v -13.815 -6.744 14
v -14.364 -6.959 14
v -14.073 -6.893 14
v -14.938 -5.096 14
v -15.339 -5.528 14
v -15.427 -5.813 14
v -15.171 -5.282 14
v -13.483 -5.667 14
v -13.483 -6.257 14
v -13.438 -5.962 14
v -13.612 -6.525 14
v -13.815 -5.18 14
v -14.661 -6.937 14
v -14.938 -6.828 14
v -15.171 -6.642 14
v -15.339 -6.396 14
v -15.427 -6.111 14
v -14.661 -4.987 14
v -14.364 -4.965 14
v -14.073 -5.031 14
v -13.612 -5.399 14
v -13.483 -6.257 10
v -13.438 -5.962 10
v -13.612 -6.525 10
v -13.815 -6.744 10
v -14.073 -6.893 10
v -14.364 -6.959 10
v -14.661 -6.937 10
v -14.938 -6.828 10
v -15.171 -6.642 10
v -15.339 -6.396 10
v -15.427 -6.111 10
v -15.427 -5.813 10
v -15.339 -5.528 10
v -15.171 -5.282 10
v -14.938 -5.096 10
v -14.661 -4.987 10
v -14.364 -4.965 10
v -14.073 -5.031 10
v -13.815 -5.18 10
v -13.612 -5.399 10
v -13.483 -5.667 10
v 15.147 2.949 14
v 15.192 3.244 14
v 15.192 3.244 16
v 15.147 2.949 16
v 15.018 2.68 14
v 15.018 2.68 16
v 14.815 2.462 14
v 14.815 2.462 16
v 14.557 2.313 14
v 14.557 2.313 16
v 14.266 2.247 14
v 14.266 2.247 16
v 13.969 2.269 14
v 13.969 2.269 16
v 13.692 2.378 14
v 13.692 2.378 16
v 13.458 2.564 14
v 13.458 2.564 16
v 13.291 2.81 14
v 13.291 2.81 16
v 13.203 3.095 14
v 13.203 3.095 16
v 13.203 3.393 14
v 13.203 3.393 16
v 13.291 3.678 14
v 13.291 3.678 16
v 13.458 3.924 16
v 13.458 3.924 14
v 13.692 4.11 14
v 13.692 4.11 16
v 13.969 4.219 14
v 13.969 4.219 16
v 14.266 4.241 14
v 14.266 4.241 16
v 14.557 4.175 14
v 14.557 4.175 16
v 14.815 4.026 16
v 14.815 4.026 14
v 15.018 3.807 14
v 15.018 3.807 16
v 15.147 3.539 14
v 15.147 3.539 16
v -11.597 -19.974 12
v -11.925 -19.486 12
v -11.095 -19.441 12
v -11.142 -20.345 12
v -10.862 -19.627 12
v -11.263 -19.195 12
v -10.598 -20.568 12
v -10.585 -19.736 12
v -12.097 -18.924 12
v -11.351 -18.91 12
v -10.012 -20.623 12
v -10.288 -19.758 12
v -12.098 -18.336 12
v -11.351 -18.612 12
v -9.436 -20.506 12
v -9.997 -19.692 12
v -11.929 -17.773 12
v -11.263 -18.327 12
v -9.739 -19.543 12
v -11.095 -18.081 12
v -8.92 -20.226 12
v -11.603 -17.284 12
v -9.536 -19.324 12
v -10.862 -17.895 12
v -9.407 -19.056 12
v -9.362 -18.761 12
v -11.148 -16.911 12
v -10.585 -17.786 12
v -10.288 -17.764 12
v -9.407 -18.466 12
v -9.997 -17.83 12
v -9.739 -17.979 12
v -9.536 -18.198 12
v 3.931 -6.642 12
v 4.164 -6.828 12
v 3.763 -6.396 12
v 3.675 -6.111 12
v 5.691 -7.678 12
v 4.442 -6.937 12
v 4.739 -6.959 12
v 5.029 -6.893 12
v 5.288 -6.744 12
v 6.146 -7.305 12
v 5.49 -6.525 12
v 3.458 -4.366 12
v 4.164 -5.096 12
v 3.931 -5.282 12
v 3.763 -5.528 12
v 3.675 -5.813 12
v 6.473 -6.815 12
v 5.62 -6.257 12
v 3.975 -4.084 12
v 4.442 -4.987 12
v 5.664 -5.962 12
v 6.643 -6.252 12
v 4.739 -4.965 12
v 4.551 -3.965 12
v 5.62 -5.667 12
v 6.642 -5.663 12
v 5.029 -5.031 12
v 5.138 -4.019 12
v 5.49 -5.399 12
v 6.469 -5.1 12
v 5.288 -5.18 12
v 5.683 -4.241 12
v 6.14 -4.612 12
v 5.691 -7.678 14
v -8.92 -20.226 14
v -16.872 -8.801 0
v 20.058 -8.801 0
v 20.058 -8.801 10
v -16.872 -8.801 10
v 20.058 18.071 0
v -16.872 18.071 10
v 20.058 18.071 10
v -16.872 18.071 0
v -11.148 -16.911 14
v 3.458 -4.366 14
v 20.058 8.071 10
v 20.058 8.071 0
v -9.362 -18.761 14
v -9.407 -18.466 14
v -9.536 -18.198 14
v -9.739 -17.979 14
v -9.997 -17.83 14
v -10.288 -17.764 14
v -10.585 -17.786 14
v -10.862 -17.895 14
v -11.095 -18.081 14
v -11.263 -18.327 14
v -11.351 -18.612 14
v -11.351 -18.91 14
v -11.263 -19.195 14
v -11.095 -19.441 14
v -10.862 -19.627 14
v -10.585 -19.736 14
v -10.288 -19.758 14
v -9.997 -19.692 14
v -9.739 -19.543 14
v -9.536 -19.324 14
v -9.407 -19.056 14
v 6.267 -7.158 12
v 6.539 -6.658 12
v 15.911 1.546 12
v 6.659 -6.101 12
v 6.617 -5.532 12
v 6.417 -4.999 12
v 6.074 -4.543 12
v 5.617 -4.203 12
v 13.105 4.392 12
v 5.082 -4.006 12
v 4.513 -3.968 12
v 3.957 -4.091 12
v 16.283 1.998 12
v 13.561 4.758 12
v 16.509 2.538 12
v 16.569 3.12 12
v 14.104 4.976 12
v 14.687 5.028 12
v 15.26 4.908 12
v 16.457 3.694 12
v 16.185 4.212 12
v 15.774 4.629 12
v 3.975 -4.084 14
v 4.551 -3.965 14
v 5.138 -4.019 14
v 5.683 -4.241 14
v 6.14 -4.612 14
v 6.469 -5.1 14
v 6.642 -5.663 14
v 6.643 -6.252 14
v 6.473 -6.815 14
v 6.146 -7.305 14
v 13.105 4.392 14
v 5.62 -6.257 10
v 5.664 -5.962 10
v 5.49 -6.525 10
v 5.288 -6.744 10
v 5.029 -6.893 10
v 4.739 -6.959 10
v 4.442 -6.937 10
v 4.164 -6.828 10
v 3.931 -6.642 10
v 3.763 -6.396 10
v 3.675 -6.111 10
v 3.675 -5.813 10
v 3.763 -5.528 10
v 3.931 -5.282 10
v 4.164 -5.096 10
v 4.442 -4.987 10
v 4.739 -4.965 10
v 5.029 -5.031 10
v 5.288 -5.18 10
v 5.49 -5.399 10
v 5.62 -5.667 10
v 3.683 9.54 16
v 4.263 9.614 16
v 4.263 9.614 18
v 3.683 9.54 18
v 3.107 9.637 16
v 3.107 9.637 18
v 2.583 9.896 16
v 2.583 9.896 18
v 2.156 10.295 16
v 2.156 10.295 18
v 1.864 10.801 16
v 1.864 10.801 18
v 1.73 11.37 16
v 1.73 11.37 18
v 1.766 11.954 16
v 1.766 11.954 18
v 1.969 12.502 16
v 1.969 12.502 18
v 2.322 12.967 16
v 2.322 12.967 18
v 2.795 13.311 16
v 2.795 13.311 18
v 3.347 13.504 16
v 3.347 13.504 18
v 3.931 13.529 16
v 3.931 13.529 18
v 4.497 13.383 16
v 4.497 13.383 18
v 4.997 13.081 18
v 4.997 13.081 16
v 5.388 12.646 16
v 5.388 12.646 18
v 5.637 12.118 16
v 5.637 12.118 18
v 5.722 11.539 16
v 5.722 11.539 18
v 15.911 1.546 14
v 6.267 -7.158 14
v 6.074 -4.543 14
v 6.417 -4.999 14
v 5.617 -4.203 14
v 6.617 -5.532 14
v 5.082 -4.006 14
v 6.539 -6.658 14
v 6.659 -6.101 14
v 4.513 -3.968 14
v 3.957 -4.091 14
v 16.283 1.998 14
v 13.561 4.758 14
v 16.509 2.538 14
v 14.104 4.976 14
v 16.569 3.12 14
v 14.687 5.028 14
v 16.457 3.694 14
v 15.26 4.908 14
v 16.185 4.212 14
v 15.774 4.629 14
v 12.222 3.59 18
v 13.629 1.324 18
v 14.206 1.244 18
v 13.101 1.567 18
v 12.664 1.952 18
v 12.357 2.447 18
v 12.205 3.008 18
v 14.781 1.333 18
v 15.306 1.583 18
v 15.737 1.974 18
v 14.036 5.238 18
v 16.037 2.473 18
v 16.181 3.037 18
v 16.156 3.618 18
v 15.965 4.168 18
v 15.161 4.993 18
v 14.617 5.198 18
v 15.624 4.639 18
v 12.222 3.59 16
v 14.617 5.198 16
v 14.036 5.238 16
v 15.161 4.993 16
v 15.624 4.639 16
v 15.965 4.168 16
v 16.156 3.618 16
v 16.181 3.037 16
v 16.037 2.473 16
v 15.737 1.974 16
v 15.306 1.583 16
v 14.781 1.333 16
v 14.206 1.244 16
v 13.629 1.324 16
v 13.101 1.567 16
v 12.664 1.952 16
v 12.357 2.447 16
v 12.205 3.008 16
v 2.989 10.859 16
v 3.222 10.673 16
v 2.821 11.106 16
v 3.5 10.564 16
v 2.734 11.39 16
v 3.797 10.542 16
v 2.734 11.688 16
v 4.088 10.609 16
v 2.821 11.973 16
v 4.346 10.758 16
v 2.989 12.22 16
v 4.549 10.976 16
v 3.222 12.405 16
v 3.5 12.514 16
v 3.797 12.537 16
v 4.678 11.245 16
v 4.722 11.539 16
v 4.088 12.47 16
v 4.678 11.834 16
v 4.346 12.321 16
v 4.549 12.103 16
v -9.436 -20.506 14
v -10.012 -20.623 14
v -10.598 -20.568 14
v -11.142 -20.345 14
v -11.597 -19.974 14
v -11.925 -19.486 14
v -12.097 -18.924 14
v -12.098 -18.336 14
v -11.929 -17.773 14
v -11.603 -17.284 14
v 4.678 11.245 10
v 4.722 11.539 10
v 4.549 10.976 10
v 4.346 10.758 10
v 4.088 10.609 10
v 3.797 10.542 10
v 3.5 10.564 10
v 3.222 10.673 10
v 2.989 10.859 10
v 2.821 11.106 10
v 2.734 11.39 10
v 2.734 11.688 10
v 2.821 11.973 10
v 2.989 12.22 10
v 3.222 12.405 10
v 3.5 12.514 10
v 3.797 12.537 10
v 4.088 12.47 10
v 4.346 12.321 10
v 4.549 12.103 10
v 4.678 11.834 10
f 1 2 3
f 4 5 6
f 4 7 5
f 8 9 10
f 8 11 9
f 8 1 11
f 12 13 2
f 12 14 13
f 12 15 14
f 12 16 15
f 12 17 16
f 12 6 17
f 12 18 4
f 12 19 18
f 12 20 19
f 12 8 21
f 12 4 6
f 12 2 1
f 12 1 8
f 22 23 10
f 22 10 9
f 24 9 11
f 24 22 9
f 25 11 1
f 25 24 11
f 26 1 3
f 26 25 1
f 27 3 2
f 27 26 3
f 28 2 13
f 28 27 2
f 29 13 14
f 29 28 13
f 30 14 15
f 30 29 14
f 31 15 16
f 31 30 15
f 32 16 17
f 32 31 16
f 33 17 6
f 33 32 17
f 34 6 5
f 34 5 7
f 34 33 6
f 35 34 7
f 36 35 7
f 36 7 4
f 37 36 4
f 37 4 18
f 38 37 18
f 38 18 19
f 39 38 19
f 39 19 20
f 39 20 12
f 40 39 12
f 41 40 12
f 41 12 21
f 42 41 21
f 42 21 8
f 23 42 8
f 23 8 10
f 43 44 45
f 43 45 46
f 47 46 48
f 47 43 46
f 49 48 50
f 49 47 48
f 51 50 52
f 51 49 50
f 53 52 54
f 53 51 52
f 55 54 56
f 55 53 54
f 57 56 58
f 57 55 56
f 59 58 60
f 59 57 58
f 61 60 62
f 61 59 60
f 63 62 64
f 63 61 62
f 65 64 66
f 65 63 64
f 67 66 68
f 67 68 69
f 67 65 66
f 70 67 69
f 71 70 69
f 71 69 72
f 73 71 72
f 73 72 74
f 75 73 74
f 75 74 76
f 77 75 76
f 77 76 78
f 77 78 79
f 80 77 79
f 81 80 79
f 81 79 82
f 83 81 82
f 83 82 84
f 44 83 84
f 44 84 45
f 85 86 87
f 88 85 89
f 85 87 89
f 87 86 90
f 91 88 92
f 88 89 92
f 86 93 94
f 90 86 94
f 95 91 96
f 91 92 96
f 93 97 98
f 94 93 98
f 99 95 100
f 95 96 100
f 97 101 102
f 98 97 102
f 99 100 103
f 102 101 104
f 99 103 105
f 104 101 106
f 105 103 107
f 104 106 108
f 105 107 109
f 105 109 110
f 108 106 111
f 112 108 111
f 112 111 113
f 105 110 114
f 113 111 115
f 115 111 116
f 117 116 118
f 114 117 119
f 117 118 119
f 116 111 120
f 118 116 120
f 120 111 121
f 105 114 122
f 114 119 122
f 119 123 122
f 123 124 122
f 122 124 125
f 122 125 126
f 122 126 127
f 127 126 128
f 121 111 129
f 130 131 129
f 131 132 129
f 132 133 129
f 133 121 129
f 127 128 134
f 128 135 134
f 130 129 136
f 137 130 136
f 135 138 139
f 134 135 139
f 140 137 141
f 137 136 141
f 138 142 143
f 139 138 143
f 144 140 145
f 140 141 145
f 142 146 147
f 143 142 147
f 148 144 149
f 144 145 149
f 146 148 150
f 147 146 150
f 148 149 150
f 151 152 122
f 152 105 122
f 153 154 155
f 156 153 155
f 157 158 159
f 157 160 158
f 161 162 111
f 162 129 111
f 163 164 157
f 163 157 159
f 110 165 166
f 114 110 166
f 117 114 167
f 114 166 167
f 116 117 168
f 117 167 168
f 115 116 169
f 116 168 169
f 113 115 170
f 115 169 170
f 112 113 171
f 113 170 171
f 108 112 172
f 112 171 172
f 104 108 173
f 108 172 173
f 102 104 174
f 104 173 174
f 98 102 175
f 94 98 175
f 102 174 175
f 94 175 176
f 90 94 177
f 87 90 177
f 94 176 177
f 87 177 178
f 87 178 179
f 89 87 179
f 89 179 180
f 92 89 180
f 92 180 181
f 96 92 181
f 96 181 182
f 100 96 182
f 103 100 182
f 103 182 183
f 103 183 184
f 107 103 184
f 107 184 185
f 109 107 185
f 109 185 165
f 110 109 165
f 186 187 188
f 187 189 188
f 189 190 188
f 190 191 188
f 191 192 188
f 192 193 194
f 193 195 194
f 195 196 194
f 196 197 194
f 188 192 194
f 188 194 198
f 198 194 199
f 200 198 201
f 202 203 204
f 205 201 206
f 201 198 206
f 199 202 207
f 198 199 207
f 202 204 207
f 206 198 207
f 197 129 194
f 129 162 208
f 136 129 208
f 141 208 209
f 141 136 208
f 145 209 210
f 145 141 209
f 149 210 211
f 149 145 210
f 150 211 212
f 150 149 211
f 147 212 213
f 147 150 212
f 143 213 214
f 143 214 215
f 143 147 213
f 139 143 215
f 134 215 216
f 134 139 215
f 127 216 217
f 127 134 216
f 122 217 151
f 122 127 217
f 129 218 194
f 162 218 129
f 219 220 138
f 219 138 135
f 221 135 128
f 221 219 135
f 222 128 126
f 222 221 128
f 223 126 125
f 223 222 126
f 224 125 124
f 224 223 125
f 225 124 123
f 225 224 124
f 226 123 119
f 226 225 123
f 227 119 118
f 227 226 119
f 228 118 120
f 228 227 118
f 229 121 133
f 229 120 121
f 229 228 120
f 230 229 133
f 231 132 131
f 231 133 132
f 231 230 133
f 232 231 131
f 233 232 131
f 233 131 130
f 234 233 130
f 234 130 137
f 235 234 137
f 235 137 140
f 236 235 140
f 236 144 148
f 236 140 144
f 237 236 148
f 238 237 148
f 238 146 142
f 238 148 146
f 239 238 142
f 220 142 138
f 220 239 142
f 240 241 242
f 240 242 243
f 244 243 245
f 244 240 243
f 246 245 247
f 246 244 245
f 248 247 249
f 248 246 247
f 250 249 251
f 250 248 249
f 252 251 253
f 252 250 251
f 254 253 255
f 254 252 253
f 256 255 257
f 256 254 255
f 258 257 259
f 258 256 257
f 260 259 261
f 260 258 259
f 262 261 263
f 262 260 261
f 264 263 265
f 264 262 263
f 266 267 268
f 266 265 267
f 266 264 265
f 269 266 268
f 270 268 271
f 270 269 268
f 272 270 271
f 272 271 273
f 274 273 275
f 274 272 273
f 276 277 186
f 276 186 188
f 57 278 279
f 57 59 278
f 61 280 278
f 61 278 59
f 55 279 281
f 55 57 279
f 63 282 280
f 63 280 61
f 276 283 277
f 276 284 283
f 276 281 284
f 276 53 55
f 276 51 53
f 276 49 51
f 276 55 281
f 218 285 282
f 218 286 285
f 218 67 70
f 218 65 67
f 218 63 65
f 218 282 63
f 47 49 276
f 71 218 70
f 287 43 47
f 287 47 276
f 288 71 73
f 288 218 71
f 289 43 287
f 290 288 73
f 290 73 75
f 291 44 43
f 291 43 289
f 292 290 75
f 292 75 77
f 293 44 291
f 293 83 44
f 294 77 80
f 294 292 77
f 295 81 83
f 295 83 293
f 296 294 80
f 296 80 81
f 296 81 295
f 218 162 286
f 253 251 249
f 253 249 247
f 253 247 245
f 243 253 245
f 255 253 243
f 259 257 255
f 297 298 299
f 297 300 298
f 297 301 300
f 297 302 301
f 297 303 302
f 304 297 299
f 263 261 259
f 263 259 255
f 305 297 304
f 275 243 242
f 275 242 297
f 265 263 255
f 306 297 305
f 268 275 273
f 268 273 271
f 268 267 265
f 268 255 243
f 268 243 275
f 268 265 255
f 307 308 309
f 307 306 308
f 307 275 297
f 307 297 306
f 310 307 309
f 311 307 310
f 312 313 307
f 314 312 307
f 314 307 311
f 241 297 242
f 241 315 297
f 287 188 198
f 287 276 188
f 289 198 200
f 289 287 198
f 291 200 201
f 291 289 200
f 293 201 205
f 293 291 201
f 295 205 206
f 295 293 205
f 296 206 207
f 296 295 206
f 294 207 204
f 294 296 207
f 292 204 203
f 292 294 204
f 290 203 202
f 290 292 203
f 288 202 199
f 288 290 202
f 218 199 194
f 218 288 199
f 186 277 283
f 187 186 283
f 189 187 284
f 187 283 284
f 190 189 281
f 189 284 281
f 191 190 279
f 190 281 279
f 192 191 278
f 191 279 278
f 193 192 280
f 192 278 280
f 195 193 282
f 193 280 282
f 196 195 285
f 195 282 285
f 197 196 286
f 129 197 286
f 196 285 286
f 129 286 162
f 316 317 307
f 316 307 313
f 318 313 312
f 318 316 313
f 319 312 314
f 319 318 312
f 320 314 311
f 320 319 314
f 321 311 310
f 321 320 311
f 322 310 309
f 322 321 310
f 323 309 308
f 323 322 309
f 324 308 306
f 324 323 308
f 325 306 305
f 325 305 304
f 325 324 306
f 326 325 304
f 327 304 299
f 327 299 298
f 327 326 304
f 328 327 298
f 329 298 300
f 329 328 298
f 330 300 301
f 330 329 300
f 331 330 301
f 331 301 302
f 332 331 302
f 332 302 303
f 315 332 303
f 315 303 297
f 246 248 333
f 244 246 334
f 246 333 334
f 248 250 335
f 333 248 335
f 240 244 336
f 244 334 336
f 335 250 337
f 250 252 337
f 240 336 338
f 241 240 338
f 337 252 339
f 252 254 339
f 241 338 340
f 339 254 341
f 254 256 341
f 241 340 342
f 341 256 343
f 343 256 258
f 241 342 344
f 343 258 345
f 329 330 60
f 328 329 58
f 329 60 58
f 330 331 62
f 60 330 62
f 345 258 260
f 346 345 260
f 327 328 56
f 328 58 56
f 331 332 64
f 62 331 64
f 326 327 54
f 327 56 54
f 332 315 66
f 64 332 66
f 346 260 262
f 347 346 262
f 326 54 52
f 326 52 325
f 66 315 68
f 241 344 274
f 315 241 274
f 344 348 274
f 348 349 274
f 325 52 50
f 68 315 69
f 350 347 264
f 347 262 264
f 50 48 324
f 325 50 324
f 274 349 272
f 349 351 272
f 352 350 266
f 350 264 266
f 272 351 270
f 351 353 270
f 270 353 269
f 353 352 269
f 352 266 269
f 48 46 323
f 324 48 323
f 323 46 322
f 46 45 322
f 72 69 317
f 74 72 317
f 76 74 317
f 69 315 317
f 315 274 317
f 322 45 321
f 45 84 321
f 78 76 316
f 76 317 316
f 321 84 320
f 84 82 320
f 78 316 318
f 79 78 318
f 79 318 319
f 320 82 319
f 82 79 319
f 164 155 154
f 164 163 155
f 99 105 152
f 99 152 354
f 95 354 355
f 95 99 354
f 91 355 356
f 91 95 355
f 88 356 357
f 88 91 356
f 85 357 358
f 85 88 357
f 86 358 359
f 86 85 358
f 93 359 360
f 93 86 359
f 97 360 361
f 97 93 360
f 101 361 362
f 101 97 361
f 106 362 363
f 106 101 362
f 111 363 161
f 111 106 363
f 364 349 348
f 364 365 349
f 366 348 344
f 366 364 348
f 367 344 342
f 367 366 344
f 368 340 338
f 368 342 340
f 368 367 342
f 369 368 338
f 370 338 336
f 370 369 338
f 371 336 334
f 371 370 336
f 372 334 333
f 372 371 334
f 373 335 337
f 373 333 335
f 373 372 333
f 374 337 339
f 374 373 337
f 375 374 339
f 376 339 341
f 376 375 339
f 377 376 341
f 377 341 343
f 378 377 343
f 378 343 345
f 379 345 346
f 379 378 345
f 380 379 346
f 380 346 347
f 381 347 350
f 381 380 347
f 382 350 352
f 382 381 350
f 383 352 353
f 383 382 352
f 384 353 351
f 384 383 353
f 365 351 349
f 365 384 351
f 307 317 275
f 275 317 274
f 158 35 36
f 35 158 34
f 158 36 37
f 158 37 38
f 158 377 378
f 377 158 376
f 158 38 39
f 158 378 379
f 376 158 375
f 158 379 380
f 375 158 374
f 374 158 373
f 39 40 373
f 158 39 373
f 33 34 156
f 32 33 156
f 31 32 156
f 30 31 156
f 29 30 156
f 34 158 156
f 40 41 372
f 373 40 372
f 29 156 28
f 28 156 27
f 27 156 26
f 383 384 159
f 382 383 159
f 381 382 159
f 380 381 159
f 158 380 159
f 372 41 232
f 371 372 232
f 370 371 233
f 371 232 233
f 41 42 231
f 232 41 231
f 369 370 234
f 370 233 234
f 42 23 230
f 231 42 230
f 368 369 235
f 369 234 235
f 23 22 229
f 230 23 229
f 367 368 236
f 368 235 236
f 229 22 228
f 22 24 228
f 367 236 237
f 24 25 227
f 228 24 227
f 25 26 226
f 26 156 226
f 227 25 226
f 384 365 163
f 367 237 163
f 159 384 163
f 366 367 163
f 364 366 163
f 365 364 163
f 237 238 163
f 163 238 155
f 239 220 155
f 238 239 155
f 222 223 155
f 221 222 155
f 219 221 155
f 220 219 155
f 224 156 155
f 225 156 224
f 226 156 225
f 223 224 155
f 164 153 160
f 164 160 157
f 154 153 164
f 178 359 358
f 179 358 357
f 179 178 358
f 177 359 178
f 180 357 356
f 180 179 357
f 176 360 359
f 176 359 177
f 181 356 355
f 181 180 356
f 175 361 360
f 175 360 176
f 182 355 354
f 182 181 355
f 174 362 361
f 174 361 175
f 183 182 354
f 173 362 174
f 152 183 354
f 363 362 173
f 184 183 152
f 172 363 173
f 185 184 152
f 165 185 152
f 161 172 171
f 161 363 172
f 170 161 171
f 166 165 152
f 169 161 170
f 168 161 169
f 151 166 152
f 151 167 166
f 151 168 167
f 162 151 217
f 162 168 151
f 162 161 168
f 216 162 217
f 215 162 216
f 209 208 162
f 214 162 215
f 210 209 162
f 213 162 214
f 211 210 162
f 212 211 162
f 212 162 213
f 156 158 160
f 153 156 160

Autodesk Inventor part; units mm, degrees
ref_plane "YZ Plane" through (0, 0, 0) normal (1, 0, 0) x (0, 1, 0)
ref_plane "XZ Plane" through (0, 0, 0) normal (0, 1, 0) x (-1, 0, 0)
ref_plane "XY Plane" through (0, 0, 0) normal (0, 0, 1) x (1, 0, 0)
sketch "Эскиз1" plane through (0, 0, 0) normal (0, 0, 1) x (1, 0, 0)
  line L0 (10.0582, -8.8009) -> (-16.8718, -8.8009)
  line L1 (-16.8718, -8.8009) -> (-16.8718, 8.0709)
  line L2 (-16.8718, 8.0709) -> (10.0582, 8.0709)
  line L3 (10.0582, 8.0709) -> (10.0582, -8.8009)
  point P0 (0, 0)
extrude "Выдавливание1" add sketch "Эскиз1" along normal blind 10
sketch "Эскиз2" plane through (0, 0, 10) normal (0, 0, 1) x (1, 0, 0)
  circle A0 centre (4.6641, -5.9619) radius 1
  circle A1 centre (-14.4383, -5.9619) radius 1
  point P0 (0, 0)
  dimension "d2" = 2
  dimension "d3" = 2
extrude "Выдавливание2" add sketch "Эскиз2" along normal blind 2
sketch "Эскиз3" plane through (4.6641, -5.9619, 12) normal (0, 0, 1) x (1, 0, 0)
  circle A0 centre (0, 0) radius 1 projected
  circle A1 centre (0, 0) radius 2
  circle A2 centre (-14.7836, -12.664) radius 2
  line L0 (-1.2061, 1.5954) -> (-15.8126, -10.949)
  line L1 (-13.5836, -14.264) -> (1.0265, -1.7165)
  point P0 (-4.6641, 5.9619)
  dimension "d6" = 4
  dimension "d7" = 4
extrude "Выдавливание3" add sketch "Эскиз3" along normal blind 2
sketch "Эскиз4" plane through (-14.4383, -5.9619, 12) normal (0, 0, 1) x (1, 0, 0)
  circle A0 centre (0, 0) radius 1
  point P0 (14.4383, 5.9619)
extrude "Выдавливание4" add sketch "Эскиз4" along normal blind 4
sketch "Эскиз5" plane through (4.6641, -5.9619, 14) normal (0, 0, 1) x (1, 0, 0)
  circle A0 centre (-10.7969, -8.6603) radius 1
  point P0 (-4.6641, 5.9619)
  dimension "d12" = 2
extrude "Выдавливание5" add sketch "Эскиз5" along normal blind 2
sketch "Эскиз6" plane through (4.6641, -5.9619, 14) normal (0, 0, 1) x (1, 0, 0)
  circle A0 centre (-15.0265, -12.7992) radius 1
  point P0 (-4.6641, 5.9619)
  dimension "d15" = 2
extrude "Выдавливание6" cut sketch "Эскиз6" against normal blind 10
sketch "Эскиз7" plane through (-14.4383, -5.9619, 16) normal (0, 0, 1) x (1, 0, 0)
  circle A0 centre (0, 0) radius 2
  circle A1 centre (8.3055, -8.6603) radius 1 projected
  circle A2 centre (8.3055, -8.6603) radius 2
  line L0 (7.3055, -6.9282) -> (1.7093, -1.0384)
  line L1 (6.6268, -7.5731) -> (1.0492, -1.7027)
  point P0 (14.4383, 5.9619)
  dimension "d18" = 4
  dimension "d19" = 4
extrude "Выдавливание7" add sketch "Эскиз7" along normal blind 2 contours A0 | A0 L0 A2 L1 | A2 | A1
sketch "Эскиз8" plane through (-14.4383, -5.9619, 18) normal (0, 0, 1) x (1, 0, 0)
  circle A0 centre (0, 0) radius 1
  point P0 (14.4383, 5.9619)
extrude "Выдавливание8" cut sketch "Эскиз8" against normal blind 1
chamfer "Фаска1" distance 0.3 angle 45 4 edges at (-9.9309, -9.9452, 18) (-9.9309, -9.9452, 16) (-10.6004, -10.5998, 16) (-10.6004, -10.5998, 18)
sketch "Эскиз9" plane through (-14.4383, -5.9619, 18) normal (0, 0, 1) x (1, 0, 0)
  line L0 (-16.7765, 10.1097) -> (30.4978, 10.1097)
  line L1 (30.4978, 10.1097) -> (30.4978, -12.7564)
  line L2 (30.4978, -12.7564) -> (-16.7765, -12.7564)
  line L3 (-16.7765, -12.7564) -> (-16.7765, 10.1097)
  point P0 (14.4383, 5.9619)
extrude "Выдавливание9" cut sketch "Эскиз9" against normal blind 4
sketch "Эскиз10" plane through (10.0582, -8.8009, 0) normal (1, 0, 0) x (0, 0, -1)
  line L0 (0, 0) -> (0, 16.8718) projected
  line L1 (-10, 0) -> (-10, 16.8718) projected
  line L2 (0, 0) -> (-10, 0)
  line L3 (-10, 0) -> (-10, 16.8718)
  line L4 (-10, 16.8718) -> (0, 16.8718)
  line L5 (0, 16.8718) -> (0, 0)
  point P0 (0, 8.8009)
extrude "Выдавливание10" add sketch "Эскиз10" along normal blind 10
sketch "Эскиз11" plane through (4.6641, -5.9619, 14) normal (0, 0, 1) x (1, 0, 0)
  circle A0 centre (9.9064, 8.993) radius 2
  arc A1 (1.0265, -1.7165) -> (-1.2061, 1.5954) centre (0, 0) ccw projected
  line L0 (8.4408, 10.3539) -> (-1.2061, 1.5954)
  line L1 (-1.2061, 1.5954) -> (1.0265, -1.7165)
  line L2 (1.0265, -1.7165) -> (11.2465, 7.5083)
  point P0 (-4.6641, 5.9619)
  point P1 (1.6027, -1.1964)
  dimension "d31" = 4
extrude "Выдавливание11" add sketch "Эскиз11" against normal blind 2 contours A0 | A0 L2 A1 L0
sketch "Эскиз12" plane through (-16.8718, 8.0709, 10) normal (0, 1, 0) x (1, 0, 0)
  line L0 (0, 10) -> (36.9299, 10) projected
  line L1 (0, 0) -> (36.9299, 0) projected
  line L2 (0, 10) -> (36.9299, 10)
  line L3 (36.9299, 10) -> (36.9299, 0)
  line L4 (36.9299, 0) -> (0, 0)
  line L5 (0, 0) -> (0, 10)
  point P0 (16.8718, 10)
extrude "Выдавливание12" add sketch "Эскиз12" along normal blind 10
sketch "Эскиз13" plane through (0, 0, 10) normal (0, 0, 1) x (1, 0, 0)
  circle A0 centre (3.7224, 11.5394) radius 1
  point P0 (0, 0)
  dimension "d36" = 2
extrude "Выдавливание13" add sketch "Эскиз13" along normal blind 6
sketch "Эскиз14" plane through (4.6641, -5.9619, 14) normal (0, 0, 1) x (1, 0, 0)
  circle A0 centre (9.5274, 9.2057) radius 1
  point P0 (-4.6641, 5.9619)
  dimension "d39" = 2
extrude "Выдавливание14" add sketch "Эскиз14" along normal blind 2
sketch "Эскиз15" plane through (3.7224, 11.5394, 16) normal (0, 0, 1) x (1, 0, 0)
  circle A0 centre (0, 0) radius 1 projected
  circle A1 centre (0, 0) radius 2
  circle A2 centre (10.469, -8.2956) radius 1 projected
  circle A3 centre (10.469, -8.2956) radius 2
  line L0 (10.314, -6.3017) -> (2, 0)
  line L1 (9.3825, -7.1474) -> (-0.2644, -15.9059) projected
  line L2 (8.4993, -7.9493) -> (0.5405, -1.9256)
  point P0 (-3.7224, -11.5394)
  dimension "d42" = 4
  dimension "d43" = 4
extrude "Выдавливание15" add sketch "Эскиз15" along normal blind 2 contours A0 | A1 | L0 A3 L2 A1 | A3 | A2
